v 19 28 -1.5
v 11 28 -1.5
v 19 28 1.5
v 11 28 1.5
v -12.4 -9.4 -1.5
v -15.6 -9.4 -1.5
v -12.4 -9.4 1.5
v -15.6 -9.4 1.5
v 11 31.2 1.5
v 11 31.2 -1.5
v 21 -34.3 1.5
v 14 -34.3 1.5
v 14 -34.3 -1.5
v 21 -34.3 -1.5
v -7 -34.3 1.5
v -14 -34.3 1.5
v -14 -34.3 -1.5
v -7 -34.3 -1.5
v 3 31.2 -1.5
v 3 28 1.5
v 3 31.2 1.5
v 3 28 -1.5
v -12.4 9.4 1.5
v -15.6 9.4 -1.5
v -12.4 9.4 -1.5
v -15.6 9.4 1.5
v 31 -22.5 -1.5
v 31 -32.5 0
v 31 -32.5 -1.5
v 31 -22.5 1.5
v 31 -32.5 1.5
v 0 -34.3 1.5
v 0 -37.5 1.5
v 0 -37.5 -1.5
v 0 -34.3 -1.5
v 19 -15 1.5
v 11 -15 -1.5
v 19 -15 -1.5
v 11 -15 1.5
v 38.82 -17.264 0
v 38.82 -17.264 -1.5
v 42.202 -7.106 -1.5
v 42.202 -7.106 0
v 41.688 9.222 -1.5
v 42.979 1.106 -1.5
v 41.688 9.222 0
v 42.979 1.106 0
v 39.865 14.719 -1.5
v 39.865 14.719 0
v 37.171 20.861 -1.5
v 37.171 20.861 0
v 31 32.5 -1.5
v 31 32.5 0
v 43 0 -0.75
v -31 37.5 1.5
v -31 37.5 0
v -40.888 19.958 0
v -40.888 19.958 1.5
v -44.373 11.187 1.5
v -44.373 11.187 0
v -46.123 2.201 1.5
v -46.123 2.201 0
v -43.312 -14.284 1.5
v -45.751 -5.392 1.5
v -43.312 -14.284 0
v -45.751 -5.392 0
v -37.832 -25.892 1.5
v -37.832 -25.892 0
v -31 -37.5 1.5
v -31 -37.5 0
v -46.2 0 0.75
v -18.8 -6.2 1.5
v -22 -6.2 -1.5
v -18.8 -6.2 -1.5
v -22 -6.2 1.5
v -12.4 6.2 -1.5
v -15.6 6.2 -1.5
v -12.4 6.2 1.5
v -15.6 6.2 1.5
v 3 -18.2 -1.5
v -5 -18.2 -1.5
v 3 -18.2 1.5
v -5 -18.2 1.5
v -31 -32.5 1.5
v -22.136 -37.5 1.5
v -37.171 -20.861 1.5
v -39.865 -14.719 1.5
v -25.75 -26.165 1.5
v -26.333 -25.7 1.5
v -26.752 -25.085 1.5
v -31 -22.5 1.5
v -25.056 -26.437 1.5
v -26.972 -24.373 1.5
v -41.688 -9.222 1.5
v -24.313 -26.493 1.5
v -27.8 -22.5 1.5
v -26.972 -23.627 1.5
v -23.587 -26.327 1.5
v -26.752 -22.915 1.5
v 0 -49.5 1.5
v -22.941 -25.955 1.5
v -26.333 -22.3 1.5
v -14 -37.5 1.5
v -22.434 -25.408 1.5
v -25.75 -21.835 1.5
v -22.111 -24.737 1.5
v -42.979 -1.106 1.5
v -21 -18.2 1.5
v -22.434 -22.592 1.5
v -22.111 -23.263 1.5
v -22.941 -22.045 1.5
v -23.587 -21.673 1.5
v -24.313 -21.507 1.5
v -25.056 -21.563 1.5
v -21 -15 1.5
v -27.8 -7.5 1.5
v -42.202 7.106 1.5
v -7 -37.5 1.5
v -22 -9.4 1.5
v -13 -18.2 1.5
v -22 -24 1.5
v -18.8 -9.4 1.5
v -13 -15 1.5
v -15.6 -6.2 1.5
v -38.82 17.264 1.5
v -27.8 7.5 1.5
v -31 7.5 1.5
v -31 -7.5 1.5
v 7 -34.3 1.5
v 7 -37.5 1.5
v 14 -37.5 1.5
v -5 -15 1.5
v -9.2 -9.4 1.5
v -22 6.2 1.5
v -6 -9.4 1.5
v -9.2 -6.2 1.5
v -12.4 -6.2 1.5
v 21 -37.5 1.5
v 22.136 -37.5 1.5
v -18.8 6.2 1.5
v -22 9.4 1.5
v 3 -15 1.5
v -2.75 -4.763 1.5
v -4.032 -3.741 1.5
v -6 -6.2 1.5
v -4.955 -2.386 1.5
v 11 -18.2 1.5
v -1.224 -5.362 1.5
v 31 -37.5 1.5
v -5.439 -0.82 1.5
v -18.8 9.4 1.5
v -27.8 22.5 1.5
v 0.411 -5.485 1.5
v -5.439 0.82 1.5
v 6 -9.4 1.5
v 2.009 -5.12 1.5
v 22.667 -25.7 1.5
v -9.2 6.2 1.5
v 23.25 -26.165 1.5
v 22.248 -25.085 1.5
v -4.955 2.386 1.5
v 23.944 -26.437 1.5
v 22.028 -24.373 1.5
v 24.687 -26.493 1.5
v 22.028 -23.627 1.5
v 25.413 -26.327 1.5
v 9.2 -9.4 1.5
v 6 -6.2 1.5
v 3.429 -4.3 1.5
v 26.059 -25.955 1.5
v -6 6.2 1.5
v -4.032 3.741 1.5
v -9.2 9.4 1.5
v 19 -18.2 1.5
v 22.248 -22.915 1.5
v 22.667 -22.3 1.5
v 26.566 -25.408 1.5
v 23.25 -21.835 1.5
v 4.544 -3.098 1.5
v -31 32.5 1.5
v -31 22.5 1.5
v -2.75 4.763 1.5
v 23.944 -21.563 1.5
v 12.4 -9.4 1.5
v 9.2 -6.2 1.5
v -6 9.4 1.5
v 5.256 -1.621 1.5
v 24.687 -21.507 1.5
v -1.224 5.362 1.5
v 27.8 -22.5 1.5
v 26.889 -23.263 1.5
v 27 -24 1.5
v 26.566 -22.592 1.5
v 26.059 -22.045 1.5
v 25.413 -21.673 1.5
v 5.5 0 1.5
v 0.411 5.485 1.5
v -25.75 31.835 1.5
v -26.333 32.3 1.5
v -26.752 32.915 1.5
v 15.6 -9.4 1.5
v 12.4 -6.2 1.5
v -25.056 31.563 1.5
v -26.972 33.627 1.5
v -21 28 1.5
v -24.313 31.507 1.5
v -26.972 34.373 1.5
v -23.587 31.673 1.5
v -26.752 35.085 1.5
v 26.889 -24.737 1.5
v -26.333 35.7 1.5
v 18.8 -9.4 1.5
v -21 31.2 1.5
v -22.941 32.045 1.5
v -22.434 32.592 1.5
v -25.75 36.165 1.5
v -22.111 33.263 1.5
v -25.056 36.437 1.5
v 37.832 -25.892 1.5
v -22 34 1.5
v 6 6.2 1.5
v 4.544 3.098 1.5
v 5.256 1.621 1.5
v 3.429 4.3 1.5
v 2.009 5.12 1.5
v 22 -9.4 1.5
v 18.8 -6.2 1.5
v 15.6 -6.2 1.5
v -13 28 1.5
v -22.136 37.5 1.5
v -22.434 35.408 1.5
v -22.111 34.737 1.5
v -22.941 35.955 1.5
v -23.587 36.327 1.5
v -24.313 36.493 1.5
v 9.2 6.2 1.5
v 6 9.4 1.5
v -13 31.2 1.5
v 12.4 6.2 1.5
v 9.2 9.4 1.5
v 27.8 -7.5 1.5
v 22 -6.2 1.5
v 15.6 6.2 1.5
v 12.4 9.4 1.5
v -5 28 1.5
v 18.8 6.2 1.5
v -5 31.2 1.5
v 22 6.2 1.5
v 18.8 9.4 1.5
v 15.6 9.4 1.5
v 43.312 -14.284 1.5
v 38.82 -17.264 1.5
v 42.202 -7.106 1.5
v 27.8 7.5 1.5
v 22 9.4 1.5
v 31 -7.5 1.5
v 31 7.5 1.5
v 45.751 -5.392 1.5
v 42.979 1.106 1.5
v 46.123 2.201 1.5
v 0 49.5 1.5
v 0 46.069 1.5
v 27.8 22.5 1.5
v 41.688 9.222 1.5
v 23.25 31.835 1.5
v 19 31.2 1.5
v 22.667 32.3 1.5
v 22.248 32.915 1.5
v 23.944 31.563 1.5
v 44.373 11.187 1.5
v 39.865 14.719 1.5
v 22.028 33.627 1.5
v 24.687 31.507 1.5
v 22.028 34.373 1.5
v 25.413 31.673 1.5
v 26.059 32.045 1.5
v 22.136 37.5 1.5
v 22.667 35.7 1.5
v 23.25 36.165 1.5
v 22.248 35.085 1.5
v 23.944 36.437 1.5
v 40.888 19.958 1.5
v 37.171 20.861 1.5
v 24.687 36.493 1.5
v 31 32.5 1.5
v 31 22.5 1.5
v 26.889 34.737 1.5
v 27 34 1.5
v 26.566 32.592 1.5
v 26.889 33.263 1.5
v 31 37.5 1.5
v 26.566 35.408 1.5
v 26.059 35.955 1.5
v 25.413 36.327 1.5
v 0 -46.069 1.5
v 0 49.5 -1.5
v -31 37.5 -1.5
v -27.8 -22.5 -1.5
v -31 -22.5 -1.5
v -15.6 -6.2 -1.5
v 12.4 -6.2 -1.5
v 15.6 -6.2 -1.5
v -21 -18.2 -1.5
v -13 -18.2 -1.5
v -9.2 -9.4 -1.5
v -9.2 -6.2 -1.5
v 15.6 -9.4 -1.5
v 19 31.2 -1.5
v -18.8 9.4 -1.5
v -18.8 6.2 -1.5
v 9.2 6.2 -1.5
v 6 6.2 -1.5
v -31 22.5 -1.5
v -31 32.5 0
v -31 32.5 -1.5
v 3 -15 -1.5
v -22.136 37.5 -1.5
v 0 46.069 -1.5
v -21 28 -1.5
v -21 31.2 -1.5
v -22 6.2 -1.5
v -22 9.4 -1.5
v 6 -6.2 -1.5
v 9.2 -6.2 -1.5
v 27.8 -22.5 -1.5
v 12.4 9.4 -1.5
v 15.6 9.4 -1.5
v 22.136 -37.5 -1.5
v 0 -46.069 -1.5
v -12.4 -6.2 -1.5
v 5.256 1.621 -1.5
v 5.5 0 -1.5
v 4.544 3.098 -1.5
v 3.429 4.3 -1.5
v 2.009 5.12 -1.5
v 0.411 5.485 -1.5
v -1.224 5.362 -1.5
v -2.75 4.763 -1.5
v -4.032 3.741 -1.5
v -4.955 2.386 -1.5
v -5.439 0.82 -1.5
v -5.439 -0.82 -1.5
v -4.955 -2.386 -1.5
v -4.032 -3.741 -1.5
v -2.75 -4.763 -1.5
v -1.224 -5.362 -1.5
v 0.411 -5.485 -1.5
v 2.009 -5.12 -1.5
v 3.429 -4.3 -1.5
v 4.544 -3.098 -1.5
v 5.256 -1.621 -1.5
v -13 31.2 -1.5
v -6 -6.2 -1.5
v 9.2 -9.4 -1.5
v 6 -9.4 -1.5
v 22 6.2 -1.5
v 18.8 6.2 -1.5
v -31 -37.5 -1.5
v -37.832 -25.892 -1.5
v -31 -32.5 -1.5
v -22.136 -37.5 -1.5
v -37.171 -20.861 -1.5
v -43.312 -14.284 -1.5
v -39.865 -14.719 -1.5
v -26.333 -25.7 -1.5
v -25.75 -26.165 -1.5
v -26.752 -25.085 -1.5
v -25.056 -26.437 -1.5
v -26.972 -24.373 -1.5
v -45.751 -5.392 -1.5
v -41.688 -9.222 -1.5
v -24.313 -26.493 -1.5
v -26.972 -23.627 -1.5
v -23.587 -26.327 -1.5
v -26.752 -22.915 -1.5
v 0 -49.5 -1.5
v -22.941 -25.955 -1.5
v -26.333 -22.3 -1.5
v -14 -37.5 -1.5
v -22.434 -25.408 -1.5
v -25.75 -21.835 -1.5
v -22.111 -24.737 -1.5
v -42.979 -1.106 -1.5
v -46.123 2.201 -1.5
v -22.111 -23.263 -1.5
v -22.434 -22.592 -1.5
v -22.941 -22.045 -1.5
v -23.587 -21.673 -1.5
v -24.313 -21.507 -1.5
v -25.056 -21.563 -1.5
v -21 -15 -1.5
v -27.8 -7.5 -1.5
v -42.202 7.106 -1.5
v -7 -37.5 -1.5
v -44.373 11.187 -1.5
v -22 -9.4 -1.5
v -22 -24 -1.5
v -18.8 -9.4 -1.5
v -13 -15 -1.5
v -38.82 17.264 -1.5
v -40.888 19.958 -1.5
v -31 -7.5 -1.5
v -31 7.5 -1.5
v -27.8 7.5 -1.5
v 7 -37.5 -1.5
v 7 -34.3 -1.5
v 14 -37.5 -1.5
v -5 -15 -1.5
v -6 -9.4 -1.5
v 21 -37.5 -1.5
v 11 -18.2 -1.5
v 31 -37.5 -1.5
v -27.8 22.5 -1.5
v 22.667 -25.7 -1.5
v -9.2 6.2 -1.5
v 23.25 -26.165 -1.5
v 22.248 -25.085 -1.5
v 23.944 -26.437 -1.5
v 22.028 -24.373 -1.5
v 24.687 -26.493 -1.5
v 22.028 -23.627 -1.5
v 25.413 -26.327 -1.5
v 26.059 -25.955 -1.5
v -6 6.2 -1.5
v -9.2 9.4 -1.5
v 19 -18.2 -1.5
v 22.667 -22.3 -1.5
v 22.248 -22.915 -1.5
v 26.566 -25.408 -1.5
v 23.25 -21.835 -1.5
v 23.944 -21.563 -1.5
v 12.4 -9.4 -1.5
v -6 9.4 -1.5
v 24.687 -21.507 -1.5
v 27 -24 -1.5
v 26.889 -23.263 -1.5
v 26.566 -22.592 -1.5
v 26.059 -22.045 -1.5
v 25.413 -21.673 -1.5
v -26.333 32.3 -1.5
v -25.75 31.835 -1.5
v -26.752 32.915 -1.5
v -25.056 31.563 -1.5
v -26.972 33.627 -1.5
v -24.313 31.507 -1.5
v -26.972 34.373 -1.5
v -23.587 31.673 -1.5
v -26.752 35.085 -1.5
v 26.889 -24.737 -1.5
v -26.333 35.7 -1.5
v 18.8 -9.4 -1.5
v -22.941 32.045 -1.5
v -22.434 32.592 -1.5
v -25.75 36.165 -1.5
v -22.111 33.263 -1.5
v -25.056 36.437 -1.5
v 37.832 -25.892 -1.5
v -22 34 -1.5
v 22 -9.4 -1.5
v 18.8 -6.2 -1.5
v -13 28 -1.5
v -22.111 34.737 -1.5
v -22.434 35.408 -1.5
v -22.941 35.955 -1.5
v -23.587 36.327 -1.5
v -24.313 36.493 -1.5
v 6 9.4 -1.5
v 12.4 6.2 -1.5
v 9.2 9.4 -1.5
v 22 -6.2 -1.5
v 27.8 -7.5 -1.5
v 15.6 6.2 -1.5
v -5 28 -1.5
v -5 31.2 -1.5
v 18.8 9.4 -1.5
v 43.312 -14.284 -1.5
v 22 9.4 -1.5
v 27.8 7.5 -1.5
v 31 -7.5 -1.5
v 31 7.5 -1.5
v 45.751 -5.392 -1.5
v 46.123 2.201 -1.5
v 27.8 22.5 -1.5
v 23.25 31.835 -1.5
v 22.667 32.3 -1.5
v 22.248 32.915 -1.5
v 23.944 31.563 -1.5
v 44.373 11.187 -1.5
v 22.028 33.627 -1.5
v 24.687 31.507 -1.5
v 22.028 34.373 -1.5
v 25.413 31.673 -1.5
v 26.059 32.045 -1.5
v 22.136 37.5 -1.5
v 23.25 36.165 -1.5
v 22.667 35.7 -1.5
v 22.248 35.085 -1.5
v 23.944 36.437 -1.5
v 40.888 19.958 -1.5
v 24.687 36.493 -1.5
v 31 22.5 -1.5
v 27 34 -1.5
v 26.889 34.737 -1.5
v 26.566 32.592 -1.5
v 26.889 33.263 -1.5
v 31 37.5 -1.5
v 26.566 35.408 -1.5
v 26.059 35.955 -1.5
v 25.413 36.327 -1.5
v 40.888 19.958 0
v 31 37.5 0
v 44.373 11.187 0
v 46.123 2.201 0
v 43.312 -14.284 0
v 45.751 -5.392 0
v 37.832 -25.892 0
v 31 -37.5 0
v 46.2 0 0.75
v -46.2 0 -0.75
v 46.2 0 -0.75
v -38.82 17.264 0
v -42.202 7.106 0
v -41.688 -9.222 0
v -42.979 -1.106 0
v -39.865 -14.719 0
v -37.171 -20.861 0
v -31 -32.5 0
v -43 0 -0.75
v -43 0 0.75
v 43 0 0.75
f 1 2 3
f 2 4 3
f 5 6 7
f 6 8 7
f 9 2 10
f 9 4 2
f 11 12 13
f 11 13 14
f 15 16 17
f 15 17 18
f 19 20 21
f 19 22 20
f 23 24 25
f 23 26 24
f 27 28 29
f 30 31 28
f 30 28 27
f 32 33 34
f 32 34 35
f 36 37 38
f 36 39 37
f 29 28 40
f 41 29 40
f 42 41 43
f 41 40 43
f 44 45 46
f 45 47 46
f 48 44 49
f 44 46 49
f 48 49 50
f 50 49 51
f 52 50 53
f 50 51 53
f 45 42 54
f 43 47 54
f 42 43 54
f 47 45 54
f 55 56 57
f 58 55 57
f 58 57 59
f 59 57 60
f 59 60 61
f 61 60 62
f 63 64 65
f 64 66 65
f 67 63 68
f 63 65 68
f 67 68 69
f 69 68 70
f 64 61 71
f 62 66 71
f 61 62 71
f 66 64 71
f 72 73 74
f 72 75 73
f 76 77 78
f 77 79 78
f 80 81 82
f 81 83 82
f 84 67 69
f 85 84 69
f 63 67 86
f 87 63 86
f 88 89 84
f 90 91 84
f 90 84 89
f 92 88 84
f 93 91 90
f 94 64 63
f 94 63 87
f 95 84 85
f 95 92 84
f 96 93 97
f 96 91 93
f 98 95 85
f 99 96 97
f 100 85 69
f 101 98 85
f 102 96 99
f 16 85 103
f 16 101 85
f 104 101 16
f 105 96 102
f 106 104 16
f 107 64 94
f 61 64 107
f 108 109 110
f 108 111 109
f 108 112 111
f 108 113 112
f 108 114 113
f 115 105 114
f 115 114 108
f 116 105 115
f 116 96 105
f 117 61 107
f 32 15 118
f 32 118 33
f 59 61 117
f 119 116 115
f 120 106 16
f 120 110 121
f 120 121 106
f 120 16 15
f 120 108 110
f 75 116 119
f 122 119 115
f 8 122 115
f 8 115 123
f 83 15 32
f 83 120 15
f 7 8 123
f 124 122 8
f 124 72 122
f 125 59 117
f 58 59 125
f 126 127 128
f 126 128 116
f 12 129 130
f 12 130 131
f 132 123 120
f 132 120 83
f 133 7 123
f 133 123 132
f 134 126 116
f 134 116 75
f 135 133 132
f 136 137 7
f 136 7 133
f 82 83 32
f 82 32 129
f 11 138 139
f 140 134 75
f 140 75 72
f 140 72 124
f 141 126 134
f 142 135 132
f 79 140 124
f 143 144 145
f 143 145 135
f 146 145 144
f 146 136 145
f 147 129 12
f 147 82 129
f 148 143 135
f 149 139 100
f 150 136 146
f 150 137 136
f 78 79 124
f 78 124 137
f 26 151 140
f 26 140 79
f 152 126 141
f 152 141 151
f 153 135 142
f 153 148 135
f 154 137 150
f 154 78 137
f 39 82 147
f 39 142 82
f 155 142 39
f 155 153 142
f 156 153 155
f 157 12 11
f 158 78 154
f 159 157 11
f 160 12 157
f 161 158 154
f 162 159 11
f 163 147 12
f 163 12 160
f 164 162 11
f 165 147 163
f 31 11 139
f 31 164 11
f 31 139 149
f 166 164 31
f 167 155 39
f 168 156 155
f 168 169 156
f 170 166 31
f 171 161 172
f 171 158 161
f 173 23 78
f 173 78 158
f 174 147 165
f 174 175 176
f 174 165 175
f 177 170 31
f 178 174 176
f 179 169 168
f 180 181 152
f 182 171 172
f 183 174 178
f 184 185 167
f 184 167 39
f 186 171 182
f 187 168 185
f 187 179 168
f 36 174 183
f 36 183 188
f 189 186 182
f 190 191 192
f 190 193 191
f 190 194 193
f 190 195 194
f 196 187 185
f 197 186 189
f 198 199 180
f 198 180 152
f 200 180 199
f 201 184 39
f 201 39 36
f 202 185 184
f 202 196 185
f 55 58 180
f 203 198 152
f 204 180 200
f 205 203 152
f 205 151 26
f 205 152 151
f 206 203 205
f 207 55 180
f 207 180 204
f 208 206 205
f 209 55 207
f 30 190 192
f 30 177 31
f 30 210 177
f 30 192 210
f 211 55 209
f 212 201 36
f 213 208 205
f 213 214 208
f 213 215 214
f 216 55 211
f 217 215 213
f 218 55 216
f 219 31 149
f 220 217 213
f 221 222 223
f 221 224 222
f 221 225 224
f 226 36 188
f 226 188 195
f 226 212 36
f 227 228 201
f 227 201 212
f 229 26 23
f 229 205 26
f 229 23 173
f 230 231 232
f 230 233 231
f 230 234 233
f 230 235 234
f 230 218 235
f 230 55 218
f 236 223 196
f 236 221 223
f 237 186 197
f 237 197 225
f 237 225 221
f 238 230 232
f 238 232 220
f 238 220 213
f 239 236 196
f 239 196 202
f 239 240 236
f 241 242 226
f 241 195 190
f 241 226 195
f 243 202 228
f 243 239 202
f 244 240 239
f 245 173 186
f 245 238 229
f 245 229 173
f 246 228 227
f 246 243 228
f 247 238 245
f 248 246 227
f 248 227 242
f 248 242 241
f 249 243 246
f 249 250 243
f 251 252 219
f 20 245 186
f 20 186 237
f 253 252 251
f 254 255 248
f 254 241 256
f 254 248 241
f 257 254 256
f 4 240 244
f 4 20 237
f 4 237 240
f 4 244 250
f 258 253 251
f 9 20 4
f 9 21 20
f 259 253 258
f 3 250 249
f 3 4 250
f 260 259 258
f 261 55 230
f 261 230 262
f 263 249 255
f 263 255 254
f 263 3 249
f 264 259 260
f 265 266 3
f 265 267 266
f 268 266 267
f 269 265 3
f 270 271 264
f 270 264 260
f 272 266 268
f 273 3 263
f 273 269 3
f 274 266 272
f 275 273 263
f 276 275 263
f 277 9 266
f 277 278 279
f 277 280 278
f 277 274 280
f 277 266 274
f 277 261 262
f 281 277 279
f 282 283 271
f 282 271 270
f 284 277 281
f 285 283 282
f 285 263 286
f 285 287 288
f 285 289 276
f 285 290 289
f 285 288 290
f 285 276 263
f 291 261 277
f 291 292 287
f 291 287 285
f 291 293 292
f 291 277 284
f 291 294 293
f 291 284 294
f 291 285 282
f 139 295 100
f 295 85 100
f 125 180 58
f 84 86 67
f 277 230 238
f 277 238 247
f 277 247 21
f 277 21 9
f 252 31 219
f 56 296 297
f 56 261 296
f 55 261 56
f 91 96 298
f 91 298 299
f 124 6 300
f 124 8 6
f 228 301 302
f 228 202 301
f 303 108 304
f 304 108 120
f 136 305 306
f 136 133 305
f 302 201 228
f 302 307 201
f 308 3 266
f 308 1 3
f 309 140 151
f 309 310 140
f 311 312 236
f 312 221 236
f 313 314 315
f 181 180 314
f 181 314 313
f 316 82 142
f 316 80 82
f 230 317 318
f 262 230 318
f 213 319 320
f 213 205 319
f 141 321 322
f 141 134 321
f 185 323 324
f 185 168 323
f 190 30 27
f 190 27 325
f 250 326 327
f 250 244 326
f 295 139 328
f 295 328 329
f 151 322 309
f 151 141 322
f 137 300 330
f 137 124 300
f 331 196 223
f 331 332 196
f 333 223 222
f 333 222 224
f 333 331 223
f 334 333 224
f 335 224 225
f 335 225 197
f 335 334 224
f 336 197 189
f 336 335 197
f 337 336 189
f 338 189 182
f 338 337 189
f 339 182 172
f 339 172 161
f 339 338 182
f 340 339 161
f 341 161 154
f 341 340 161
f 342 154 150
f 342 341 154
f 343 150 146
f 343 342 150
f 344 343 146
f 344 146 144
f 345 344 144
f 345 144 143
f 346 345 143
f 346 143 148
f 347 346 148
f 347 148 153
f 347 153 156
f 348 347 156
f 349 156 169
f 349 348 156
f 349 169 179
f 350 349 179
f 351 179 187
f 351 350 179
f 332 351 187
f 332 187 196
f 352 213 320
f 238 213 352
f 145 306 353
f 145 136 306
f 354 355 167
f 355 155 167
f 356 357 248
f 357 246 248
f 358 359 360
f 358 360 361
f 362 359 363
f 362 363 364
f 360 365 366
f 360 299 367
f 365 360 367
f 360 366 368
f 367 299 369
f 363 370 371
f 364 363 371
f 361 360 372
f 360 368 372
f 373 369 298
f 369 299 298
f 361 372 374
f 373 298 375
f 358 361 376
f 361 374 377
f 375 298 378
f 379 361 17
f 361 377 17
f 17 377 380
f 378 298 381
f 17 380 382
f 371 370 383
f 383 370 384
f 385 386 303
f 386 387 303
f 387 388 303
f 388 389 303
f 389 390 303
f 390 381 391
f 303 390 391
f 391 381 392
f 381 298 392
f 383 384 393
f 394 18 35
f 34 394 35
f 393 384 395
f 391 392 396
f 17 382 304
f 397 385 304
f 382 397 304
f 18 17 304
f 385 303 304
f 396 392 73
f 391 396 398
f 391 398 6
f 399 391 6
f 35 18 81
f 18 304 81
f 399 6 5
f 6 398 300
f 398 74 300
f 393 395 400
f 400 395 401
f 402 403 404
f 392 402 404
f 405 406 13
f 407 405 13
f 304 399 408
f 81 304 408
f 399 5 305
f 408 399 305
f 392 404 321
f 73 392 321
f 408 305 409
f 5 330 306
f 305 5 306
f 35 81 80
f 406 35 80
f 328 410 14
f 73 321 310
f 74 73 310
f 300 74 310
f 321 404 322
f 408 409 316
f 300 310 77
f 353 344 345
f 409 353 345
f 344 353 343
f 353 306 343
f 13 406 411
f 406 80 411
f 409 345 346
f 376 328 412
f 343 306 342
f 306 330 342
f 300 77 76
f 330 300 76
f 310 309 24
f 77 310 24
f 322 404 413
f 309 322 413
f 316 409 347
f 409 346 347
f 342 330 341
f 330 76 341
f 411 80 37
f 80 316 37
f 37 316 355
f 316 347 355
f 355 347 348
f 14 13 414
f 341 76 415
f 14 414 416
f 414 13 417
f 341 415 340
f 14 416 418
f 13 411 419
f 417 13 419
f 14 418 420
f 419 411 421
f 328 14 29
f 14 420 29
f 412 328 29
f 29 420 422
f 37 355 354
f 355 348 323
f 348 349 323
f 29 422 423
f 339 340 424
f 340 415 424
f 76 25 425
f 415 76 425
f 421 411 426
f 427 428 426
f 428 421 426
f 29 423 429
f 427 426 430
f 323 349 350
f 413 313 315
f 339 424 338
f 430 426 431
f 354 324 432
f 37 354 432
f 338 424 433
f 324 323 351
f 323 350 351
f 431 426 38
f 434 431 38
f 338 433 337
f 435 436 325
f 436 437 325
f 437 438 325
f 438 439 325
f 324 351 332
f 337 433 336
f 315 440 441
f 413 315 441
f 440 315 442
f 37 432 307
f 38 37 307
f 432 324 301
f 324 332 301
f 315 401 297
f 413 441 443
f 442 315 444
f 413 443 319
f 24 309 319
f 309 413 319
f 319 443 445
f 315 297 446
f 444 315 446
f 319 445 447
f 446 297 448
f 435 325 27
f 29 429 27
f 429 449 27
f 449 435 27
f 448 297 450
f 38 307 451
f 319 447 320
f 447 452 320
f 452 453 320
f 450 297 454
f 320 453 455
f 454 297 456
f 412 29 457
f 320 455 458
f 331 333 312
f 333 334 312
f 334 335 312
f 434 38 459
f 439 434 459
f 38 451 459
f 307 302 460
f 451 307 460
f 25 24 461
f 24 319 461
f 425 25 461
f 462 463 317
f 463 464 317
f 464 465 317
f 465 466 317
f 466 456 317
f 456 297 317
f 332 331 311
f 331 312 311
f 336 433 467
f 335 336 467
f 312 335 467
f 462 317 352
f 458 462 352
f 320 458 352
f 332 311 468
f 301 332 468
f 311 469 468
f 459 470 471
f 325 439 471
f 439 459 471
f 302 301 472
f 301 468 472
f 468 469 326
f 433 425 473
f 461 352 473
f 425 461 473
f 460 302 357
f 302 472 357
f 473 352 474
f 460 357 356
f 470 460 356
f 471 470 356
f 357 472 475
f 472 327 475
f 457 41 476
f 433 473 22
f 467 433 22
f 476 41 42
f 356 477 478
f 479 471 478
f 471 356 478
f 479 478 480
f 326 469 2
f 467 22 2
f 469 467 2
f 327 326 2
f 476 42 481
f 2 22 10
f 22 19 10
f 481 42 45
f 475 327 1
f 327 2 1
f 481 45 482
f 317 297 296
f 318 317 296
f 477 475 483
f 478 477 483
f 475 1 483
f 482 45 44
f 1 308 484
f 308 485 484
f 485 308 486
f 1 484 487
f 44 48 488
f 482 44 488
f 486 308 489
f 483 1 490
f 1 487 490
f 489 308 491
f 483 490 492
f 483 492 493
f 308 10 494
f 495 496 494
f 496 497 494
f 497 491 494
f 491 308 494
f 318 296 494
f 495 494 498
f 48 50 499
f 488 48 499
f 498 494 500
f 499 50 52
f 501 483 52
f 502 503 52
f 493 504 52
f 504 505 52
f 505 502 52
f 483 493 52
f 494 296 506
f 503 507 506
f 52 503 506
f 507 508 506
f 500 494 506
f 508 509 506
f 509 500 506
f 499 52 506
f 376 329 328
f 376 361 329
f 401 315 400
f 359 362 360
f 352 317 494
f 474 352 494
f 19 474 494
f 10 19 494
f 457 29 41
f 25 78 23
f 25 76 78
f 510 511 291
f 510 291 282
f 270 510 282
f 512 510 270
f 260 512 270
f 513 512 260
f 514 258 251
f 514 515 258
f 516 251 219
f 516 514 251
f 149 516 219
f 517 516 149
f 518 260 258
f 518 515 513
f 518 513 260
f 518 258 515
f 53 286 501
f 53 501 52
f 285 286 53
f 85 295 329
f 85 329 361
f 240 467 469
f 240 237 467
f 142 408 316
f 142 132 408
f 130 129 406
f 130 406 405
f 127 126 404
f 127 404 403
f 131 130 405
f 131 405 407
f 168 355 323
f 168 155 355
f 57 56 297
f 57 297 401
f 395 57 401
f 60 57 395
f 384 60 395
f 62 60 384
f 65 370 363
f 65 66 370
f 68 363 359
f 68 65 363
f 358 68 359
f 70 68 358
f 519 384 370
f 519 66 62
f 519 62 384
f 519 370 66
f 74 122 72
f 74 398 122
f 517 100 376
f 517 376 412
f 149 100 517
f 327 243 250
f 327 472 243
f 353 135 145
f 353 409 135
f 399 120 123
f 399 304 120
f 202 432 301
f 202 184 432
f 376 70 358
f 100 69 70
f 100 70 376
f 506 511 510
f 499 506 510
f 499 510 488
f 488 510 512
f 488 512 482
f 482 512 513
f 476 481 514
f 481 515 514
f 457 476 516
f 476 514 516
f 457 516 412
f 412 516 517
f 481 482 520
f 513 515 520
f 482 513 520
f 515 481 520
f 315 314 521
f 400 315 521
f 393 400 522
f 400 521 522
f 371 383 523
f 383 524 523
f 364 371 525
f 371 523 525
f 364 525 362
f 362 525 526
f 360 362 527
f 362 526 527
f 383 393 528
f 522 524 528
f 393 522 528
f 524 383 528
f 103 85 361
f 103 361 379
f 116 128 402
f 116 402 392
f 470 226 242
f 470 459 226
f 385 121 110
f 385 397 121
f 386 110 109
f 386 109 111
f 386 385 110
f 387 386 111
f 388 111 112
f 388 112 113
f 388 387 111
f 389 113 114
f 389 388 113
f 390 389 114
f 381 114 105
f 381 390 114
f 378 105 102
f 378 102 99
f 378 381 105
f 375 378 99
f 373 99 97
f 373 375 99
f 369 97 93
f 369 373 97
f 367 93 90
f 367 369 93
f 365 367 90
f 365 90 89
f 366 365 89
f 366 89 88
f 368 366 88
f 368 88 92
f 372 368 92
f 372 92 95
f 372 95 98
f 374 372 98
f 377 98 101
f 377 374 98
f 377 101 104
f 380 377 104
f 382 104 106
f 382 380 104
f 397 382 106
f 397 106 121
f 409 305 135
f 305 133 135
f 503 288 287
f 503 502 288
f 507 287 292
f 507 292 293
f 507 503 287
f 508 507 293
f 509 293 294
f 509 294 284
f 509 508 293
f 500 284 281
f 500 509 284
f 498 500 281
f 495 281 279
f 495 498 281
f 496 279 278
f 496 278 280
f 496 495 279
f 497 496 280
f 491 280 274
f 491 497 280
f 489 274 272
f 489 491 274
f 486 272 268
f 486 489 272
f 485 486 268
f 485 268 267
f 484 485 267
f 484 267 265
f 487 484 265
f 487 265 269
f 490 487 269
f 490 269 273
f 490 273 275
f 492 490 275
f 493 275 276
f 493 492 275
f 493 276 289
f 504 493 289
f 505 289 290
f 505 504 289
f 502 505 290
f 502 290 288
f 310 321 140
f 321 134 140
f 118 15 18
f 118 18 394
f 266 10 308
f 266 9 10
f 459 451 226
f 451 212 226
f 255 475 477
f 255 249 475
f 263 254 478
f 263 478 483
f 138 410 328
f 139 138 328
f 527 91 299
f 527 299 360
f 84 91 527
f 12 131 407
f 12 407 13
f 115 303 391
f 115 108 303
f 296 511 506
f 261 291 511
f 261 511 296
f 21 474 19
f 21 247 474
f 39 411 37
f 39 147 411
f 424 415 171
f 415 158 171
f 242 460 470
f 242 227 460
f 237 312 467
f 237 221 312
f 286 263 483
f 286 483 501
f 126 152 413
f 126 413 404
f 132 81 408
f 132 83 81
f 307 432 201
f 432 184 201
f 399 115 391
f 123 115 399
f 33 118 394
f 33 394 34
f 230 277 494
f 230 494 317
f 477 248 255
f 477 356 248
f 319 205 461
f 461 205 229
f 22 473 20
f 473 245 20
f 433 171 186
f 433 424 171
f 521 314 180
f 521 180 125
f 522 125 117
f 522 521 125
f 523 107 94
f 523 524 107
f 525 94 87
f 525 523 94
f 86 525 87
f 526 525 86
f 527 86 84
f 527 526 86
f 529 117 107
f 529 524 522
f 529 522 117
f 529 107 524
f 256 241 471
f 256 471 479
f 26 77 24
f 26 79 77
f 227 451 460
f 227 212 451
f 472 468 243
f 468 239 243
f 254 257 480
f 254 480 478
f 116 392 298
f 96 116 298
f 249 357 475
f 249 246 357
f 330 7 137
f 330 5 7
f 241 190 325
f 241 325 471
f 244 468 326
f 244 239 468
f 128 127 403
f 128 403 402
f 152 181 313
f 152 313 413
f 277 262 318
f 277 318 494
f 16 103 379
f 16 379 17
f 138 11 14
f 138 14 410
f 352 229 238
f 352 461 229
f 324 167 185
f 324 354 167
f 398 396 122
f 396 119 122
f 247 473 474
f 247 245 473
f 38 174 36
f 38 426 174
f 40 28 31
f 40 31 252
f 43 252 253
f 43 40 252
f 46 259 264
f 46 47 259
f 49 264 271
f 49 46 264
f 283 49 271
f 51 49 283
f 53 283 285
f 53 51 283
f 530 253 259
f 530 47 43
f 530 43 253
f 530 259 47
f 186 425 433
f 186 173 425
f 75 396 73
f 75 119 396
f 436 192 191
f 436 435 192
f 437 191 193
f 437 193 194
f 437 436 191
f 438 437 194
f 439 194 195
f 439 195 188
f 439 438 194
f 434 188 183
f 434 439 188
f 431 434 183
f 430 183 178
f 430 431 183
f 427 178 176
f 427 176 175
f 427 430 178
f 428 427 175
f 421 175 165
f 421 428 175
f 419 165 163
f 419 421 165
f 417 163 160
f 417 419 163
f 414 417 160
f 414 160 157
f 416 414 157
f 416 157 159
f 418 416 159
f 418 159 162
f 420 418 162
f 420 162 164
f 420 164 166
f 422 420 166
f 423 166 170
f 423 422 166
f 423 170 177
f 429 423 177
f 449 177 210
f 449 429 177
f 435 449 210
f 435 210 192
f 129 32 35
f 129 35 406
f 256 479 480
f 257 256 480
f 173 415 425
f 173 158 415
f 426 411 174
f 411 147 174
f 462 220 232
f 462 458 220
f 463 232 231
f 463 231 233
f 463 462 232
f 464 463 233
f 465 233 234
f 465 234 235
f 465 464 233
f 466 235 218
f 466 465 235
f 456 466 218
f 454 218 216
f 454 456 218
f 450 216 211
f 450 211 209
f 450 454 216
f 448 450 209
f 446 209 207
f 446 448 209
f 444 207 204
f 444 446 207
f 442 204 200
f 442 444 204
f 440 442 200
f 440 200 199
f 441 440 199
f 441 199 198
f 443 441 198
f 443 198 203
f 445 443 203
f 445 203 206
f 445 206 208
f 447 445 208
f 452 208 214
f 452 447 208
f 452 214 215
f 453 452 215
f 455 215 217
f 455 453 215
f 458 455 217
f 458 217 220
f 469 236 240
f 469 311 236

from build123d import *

# Parameters (mm, degrees)
F0_R     = 2.5
F0_W     = 8
F0_H     = 3.2
F0_W_2   = 3.2
F0_R_2   = 5.5
F1_DEPTH = 1.5


with BuildPart() as f1:
    # F0 (on Top) → F1 (new body, symmetric)
    with BuildSketch(Plane.XY):
        with BuildLine():
            Line((31, 22.5), (27.8, 22.5))
            Line((27.8, 22.5), (27.8, 7.5))
            Line((27.8, 7.5), (31, 7.5))
            Line((31, 7.5), (31, -7.5))
            Line((31, -7.5), (27.8, -7.5))
            Line((27.8, -7.5), (27.8, -22.5))
            Line((27.8, -22.5), (31, -22.5))
            Line((31, -22.5), (31, -32.5))
            add(Edge.make_bspline(
                [(31, -32.5), (37, -21.666667), (49, 0), (37, 21.666667), (31, 32.5)],
                knots=[0, 0, 0, 0, 34.644624, 69.289249, 69.289249, 69.289249, 69.289249], degree=3))
            Line((31, 32.5), (31, 22.5))
        make_face()
        with BuildLine():
            Line((0, 49.5), (-31, 37.5))
            add(Edge.make_bspline(
                [(-31, 37.5), (-38.6, 25), (-53.8, 0), (-38.6, -25), (-31, -37.5)],
                knots=[0, 0, 0, 0, 40.46344, 80.926881, 80.926881, 80.926881, 80.926881], degree=3))
            Line((-31, -37.5), (0, -49.5))
            Line((0, -49.5), (31, -37.5))
            add(Edge.make_bspline(
                [(31, 37.5), (38.6, 25), (53.8, 0), (38.6, -25), (31, -37.5)],
                knots=[0, 0, 0, 0, 40.46344, 80.926881, 80.926881, 80.926881, 80.926881], degree=3))
            Line((31, 37.5), (0, 49.5))
        make_face()
        with Locations((-24.5, -24)):
            Circle(F0_R, mode=Mode.SUBTRACT)
        with Locations((-17, -16.6)):
            Rectangle(F0_W, F0_H, mode=Mode.SUBTRACT)
        with Locations((-1, -16.6)):
            Rectangle(F0_W, F0_H, mode=Mode.SUBTRACT)
        with Locations((-20.4, -7.8)):
            Rectangle(F0_W_2, F0_H, mode=Mode.SUBTRACT)
        with Locations((-14, -7.8)):
            Rectangle(F0_W_2, F0_H, mode=Mode.SUBTRACT)
        with Locations((-7.6, -7.8)):
            Rectangle(F0_W_2, F0_H, mode=Mode.SUBTRACT)
        Polygon((0, -46.068615), (-22.135589, -37.5), (-21, -37.5), (-14, -37.5), (-14, -34.3), (-7, -34.3), (-7, -37.5), (0, -37.5), (0, -34.3), (7, -34.3), (7, -37.5), (14, -37.5), (14, -34.3), (21, -34.3), (21, -37.5), (22.135589, -37.5), align=None, mode=Mode.SUBTRACT)
        with Locations((24.5, -24)):
            Circle(F0_R, mode=Mode.SUBTRACT)
        with Locations((15, -16.6)):
            Rectangle(F0_W, F0_H, mode=Mode.SUBTRACT)
        with Locations((7.6, -7.8)):
            Rectangle(F0_W_2, F0_H, mode=Mode.SUBTRACT)
        with Locations((14, -7.8)):
            Rectangle(F0_W_2, F0_H, mode=Mode.SUBTRACT)
        with Locations((20.4, -7.8)):
            Rectangle(F0_W_2, F0_H, mode=Mode.SUBTRACT)
        with BuildLine():
            Line((-31, -22.5), (-31, -32.5))
            add(Edge.make_bspline(
                [(-31, 32.5), (-37, 21.666667), (-49, 0), (-37, -21.666667), (-31, -32.5)],
                knots=[0, 0, 0, 0, 34.644624, 69.289249, 69.289249, 69.289249, 69.289249], degree=3))
            Line((-31, 32.5), (-31, 22.5))
            Line((-31, 22.5), (-27.8, 22.5))
            Line((-27.8, 22.5), (-27.8, 7.5))
            Line((-27.8, 7.5), (-31, 7.5))
            Line((-31, 7.5), (-31, -7.5))
            Line((-31, -7.5), (-27.8, -7.5))
            Line((-27.8, -7.5), (-27.8, -22.5))
            Line((-27.8, -22.5), (-31, -22.5))
        make_face(mode=Mode.SUBTRACT)
        with Locations((-20.4, 7.8)):
            Rectangle(F0_W_2, F0_H, mode=Mode.SUBTRACT)
        with Locations((-14, 7.8)):
            Rectangle(F0_W_2, F0_H, mode=Mode.SUBTRACT)
        with Locations((-7.6, 7.8)):
            Rectangle(F0_W_2, F0_H, mode=Mode.SUBTRACT)
        with Locations((-17, 29.6)):
            Rectangle(F0_W, F0_H, mode=Mode.SUBTRACT)
        with Locations((-24.5, 34)):
            Circle(F0_R, mode=Mode.SUBTRACT)
        with Locations((-1, 29.6)):
            Rectangle(F0_W, F0_H, mode=Mode.SUBTRACT)
        Circle(F0_R_2, mode=Mode.SUBTRACT)
        with Locations((7.6, 7.8)):
            Rectangle(F0_W_2, F0_H, mode=Mode.SUBTRACT)
        with Locations((14, 7.8)):
            Rectangle(F0_W_2, F0_H, mode=Mode.SUBTRACT)
        with Locations((20.4, 7.8)):
            Rectangle(F0_W_2, F0_H, mode=Mode.SUBTRACT)
        with BuildLine():
            Line((27.8, 7.5), (27.8, 22.5))
            Line((27.8, 22.5), (31, 22.5))
            Line((31, 22.5), (31, 32.5))
            add(Edge.make_bspline(
                [(31, -32.5), (37, -21.666667), (49, 0), (37, 21.666667), (31, 32.5)],
                knots=[0, 0, 0, 0, 34.644624, 69.289249, 69.289249, 69.289249, 69.289249], degree=3))
            Line((31, -32.5), (31, -22.5))
            Line((31, -22.5), (27.8, -22.5))
            Line((27.8, -22.5), (27.8, -7.5))
            Line((27.8, -7.5), (31, -7.5))
            Line((31, -7.5), (31, 7.5))
            Line((31, 7.5), (27.8, 7.5))
        make_face(mode=Mode.SUBTRACT)
        with Locations((15, 29.6)):
            Rectangle(F0_W, F0_H, mode=Mode.SUBTRACT)
        with Locations((24.5, 34)):
            Circle(F0_R, mode=Mode.SUBTRACT)
        Polygon((22.135589, 37.5), (0, 37.5), (-22.135589, 37.5), (0, 46.068615), align=None, mode=Mode.SUBTRACT)
    extrude(amount=F1_DEPTH, both=True)


solid = f1.part
